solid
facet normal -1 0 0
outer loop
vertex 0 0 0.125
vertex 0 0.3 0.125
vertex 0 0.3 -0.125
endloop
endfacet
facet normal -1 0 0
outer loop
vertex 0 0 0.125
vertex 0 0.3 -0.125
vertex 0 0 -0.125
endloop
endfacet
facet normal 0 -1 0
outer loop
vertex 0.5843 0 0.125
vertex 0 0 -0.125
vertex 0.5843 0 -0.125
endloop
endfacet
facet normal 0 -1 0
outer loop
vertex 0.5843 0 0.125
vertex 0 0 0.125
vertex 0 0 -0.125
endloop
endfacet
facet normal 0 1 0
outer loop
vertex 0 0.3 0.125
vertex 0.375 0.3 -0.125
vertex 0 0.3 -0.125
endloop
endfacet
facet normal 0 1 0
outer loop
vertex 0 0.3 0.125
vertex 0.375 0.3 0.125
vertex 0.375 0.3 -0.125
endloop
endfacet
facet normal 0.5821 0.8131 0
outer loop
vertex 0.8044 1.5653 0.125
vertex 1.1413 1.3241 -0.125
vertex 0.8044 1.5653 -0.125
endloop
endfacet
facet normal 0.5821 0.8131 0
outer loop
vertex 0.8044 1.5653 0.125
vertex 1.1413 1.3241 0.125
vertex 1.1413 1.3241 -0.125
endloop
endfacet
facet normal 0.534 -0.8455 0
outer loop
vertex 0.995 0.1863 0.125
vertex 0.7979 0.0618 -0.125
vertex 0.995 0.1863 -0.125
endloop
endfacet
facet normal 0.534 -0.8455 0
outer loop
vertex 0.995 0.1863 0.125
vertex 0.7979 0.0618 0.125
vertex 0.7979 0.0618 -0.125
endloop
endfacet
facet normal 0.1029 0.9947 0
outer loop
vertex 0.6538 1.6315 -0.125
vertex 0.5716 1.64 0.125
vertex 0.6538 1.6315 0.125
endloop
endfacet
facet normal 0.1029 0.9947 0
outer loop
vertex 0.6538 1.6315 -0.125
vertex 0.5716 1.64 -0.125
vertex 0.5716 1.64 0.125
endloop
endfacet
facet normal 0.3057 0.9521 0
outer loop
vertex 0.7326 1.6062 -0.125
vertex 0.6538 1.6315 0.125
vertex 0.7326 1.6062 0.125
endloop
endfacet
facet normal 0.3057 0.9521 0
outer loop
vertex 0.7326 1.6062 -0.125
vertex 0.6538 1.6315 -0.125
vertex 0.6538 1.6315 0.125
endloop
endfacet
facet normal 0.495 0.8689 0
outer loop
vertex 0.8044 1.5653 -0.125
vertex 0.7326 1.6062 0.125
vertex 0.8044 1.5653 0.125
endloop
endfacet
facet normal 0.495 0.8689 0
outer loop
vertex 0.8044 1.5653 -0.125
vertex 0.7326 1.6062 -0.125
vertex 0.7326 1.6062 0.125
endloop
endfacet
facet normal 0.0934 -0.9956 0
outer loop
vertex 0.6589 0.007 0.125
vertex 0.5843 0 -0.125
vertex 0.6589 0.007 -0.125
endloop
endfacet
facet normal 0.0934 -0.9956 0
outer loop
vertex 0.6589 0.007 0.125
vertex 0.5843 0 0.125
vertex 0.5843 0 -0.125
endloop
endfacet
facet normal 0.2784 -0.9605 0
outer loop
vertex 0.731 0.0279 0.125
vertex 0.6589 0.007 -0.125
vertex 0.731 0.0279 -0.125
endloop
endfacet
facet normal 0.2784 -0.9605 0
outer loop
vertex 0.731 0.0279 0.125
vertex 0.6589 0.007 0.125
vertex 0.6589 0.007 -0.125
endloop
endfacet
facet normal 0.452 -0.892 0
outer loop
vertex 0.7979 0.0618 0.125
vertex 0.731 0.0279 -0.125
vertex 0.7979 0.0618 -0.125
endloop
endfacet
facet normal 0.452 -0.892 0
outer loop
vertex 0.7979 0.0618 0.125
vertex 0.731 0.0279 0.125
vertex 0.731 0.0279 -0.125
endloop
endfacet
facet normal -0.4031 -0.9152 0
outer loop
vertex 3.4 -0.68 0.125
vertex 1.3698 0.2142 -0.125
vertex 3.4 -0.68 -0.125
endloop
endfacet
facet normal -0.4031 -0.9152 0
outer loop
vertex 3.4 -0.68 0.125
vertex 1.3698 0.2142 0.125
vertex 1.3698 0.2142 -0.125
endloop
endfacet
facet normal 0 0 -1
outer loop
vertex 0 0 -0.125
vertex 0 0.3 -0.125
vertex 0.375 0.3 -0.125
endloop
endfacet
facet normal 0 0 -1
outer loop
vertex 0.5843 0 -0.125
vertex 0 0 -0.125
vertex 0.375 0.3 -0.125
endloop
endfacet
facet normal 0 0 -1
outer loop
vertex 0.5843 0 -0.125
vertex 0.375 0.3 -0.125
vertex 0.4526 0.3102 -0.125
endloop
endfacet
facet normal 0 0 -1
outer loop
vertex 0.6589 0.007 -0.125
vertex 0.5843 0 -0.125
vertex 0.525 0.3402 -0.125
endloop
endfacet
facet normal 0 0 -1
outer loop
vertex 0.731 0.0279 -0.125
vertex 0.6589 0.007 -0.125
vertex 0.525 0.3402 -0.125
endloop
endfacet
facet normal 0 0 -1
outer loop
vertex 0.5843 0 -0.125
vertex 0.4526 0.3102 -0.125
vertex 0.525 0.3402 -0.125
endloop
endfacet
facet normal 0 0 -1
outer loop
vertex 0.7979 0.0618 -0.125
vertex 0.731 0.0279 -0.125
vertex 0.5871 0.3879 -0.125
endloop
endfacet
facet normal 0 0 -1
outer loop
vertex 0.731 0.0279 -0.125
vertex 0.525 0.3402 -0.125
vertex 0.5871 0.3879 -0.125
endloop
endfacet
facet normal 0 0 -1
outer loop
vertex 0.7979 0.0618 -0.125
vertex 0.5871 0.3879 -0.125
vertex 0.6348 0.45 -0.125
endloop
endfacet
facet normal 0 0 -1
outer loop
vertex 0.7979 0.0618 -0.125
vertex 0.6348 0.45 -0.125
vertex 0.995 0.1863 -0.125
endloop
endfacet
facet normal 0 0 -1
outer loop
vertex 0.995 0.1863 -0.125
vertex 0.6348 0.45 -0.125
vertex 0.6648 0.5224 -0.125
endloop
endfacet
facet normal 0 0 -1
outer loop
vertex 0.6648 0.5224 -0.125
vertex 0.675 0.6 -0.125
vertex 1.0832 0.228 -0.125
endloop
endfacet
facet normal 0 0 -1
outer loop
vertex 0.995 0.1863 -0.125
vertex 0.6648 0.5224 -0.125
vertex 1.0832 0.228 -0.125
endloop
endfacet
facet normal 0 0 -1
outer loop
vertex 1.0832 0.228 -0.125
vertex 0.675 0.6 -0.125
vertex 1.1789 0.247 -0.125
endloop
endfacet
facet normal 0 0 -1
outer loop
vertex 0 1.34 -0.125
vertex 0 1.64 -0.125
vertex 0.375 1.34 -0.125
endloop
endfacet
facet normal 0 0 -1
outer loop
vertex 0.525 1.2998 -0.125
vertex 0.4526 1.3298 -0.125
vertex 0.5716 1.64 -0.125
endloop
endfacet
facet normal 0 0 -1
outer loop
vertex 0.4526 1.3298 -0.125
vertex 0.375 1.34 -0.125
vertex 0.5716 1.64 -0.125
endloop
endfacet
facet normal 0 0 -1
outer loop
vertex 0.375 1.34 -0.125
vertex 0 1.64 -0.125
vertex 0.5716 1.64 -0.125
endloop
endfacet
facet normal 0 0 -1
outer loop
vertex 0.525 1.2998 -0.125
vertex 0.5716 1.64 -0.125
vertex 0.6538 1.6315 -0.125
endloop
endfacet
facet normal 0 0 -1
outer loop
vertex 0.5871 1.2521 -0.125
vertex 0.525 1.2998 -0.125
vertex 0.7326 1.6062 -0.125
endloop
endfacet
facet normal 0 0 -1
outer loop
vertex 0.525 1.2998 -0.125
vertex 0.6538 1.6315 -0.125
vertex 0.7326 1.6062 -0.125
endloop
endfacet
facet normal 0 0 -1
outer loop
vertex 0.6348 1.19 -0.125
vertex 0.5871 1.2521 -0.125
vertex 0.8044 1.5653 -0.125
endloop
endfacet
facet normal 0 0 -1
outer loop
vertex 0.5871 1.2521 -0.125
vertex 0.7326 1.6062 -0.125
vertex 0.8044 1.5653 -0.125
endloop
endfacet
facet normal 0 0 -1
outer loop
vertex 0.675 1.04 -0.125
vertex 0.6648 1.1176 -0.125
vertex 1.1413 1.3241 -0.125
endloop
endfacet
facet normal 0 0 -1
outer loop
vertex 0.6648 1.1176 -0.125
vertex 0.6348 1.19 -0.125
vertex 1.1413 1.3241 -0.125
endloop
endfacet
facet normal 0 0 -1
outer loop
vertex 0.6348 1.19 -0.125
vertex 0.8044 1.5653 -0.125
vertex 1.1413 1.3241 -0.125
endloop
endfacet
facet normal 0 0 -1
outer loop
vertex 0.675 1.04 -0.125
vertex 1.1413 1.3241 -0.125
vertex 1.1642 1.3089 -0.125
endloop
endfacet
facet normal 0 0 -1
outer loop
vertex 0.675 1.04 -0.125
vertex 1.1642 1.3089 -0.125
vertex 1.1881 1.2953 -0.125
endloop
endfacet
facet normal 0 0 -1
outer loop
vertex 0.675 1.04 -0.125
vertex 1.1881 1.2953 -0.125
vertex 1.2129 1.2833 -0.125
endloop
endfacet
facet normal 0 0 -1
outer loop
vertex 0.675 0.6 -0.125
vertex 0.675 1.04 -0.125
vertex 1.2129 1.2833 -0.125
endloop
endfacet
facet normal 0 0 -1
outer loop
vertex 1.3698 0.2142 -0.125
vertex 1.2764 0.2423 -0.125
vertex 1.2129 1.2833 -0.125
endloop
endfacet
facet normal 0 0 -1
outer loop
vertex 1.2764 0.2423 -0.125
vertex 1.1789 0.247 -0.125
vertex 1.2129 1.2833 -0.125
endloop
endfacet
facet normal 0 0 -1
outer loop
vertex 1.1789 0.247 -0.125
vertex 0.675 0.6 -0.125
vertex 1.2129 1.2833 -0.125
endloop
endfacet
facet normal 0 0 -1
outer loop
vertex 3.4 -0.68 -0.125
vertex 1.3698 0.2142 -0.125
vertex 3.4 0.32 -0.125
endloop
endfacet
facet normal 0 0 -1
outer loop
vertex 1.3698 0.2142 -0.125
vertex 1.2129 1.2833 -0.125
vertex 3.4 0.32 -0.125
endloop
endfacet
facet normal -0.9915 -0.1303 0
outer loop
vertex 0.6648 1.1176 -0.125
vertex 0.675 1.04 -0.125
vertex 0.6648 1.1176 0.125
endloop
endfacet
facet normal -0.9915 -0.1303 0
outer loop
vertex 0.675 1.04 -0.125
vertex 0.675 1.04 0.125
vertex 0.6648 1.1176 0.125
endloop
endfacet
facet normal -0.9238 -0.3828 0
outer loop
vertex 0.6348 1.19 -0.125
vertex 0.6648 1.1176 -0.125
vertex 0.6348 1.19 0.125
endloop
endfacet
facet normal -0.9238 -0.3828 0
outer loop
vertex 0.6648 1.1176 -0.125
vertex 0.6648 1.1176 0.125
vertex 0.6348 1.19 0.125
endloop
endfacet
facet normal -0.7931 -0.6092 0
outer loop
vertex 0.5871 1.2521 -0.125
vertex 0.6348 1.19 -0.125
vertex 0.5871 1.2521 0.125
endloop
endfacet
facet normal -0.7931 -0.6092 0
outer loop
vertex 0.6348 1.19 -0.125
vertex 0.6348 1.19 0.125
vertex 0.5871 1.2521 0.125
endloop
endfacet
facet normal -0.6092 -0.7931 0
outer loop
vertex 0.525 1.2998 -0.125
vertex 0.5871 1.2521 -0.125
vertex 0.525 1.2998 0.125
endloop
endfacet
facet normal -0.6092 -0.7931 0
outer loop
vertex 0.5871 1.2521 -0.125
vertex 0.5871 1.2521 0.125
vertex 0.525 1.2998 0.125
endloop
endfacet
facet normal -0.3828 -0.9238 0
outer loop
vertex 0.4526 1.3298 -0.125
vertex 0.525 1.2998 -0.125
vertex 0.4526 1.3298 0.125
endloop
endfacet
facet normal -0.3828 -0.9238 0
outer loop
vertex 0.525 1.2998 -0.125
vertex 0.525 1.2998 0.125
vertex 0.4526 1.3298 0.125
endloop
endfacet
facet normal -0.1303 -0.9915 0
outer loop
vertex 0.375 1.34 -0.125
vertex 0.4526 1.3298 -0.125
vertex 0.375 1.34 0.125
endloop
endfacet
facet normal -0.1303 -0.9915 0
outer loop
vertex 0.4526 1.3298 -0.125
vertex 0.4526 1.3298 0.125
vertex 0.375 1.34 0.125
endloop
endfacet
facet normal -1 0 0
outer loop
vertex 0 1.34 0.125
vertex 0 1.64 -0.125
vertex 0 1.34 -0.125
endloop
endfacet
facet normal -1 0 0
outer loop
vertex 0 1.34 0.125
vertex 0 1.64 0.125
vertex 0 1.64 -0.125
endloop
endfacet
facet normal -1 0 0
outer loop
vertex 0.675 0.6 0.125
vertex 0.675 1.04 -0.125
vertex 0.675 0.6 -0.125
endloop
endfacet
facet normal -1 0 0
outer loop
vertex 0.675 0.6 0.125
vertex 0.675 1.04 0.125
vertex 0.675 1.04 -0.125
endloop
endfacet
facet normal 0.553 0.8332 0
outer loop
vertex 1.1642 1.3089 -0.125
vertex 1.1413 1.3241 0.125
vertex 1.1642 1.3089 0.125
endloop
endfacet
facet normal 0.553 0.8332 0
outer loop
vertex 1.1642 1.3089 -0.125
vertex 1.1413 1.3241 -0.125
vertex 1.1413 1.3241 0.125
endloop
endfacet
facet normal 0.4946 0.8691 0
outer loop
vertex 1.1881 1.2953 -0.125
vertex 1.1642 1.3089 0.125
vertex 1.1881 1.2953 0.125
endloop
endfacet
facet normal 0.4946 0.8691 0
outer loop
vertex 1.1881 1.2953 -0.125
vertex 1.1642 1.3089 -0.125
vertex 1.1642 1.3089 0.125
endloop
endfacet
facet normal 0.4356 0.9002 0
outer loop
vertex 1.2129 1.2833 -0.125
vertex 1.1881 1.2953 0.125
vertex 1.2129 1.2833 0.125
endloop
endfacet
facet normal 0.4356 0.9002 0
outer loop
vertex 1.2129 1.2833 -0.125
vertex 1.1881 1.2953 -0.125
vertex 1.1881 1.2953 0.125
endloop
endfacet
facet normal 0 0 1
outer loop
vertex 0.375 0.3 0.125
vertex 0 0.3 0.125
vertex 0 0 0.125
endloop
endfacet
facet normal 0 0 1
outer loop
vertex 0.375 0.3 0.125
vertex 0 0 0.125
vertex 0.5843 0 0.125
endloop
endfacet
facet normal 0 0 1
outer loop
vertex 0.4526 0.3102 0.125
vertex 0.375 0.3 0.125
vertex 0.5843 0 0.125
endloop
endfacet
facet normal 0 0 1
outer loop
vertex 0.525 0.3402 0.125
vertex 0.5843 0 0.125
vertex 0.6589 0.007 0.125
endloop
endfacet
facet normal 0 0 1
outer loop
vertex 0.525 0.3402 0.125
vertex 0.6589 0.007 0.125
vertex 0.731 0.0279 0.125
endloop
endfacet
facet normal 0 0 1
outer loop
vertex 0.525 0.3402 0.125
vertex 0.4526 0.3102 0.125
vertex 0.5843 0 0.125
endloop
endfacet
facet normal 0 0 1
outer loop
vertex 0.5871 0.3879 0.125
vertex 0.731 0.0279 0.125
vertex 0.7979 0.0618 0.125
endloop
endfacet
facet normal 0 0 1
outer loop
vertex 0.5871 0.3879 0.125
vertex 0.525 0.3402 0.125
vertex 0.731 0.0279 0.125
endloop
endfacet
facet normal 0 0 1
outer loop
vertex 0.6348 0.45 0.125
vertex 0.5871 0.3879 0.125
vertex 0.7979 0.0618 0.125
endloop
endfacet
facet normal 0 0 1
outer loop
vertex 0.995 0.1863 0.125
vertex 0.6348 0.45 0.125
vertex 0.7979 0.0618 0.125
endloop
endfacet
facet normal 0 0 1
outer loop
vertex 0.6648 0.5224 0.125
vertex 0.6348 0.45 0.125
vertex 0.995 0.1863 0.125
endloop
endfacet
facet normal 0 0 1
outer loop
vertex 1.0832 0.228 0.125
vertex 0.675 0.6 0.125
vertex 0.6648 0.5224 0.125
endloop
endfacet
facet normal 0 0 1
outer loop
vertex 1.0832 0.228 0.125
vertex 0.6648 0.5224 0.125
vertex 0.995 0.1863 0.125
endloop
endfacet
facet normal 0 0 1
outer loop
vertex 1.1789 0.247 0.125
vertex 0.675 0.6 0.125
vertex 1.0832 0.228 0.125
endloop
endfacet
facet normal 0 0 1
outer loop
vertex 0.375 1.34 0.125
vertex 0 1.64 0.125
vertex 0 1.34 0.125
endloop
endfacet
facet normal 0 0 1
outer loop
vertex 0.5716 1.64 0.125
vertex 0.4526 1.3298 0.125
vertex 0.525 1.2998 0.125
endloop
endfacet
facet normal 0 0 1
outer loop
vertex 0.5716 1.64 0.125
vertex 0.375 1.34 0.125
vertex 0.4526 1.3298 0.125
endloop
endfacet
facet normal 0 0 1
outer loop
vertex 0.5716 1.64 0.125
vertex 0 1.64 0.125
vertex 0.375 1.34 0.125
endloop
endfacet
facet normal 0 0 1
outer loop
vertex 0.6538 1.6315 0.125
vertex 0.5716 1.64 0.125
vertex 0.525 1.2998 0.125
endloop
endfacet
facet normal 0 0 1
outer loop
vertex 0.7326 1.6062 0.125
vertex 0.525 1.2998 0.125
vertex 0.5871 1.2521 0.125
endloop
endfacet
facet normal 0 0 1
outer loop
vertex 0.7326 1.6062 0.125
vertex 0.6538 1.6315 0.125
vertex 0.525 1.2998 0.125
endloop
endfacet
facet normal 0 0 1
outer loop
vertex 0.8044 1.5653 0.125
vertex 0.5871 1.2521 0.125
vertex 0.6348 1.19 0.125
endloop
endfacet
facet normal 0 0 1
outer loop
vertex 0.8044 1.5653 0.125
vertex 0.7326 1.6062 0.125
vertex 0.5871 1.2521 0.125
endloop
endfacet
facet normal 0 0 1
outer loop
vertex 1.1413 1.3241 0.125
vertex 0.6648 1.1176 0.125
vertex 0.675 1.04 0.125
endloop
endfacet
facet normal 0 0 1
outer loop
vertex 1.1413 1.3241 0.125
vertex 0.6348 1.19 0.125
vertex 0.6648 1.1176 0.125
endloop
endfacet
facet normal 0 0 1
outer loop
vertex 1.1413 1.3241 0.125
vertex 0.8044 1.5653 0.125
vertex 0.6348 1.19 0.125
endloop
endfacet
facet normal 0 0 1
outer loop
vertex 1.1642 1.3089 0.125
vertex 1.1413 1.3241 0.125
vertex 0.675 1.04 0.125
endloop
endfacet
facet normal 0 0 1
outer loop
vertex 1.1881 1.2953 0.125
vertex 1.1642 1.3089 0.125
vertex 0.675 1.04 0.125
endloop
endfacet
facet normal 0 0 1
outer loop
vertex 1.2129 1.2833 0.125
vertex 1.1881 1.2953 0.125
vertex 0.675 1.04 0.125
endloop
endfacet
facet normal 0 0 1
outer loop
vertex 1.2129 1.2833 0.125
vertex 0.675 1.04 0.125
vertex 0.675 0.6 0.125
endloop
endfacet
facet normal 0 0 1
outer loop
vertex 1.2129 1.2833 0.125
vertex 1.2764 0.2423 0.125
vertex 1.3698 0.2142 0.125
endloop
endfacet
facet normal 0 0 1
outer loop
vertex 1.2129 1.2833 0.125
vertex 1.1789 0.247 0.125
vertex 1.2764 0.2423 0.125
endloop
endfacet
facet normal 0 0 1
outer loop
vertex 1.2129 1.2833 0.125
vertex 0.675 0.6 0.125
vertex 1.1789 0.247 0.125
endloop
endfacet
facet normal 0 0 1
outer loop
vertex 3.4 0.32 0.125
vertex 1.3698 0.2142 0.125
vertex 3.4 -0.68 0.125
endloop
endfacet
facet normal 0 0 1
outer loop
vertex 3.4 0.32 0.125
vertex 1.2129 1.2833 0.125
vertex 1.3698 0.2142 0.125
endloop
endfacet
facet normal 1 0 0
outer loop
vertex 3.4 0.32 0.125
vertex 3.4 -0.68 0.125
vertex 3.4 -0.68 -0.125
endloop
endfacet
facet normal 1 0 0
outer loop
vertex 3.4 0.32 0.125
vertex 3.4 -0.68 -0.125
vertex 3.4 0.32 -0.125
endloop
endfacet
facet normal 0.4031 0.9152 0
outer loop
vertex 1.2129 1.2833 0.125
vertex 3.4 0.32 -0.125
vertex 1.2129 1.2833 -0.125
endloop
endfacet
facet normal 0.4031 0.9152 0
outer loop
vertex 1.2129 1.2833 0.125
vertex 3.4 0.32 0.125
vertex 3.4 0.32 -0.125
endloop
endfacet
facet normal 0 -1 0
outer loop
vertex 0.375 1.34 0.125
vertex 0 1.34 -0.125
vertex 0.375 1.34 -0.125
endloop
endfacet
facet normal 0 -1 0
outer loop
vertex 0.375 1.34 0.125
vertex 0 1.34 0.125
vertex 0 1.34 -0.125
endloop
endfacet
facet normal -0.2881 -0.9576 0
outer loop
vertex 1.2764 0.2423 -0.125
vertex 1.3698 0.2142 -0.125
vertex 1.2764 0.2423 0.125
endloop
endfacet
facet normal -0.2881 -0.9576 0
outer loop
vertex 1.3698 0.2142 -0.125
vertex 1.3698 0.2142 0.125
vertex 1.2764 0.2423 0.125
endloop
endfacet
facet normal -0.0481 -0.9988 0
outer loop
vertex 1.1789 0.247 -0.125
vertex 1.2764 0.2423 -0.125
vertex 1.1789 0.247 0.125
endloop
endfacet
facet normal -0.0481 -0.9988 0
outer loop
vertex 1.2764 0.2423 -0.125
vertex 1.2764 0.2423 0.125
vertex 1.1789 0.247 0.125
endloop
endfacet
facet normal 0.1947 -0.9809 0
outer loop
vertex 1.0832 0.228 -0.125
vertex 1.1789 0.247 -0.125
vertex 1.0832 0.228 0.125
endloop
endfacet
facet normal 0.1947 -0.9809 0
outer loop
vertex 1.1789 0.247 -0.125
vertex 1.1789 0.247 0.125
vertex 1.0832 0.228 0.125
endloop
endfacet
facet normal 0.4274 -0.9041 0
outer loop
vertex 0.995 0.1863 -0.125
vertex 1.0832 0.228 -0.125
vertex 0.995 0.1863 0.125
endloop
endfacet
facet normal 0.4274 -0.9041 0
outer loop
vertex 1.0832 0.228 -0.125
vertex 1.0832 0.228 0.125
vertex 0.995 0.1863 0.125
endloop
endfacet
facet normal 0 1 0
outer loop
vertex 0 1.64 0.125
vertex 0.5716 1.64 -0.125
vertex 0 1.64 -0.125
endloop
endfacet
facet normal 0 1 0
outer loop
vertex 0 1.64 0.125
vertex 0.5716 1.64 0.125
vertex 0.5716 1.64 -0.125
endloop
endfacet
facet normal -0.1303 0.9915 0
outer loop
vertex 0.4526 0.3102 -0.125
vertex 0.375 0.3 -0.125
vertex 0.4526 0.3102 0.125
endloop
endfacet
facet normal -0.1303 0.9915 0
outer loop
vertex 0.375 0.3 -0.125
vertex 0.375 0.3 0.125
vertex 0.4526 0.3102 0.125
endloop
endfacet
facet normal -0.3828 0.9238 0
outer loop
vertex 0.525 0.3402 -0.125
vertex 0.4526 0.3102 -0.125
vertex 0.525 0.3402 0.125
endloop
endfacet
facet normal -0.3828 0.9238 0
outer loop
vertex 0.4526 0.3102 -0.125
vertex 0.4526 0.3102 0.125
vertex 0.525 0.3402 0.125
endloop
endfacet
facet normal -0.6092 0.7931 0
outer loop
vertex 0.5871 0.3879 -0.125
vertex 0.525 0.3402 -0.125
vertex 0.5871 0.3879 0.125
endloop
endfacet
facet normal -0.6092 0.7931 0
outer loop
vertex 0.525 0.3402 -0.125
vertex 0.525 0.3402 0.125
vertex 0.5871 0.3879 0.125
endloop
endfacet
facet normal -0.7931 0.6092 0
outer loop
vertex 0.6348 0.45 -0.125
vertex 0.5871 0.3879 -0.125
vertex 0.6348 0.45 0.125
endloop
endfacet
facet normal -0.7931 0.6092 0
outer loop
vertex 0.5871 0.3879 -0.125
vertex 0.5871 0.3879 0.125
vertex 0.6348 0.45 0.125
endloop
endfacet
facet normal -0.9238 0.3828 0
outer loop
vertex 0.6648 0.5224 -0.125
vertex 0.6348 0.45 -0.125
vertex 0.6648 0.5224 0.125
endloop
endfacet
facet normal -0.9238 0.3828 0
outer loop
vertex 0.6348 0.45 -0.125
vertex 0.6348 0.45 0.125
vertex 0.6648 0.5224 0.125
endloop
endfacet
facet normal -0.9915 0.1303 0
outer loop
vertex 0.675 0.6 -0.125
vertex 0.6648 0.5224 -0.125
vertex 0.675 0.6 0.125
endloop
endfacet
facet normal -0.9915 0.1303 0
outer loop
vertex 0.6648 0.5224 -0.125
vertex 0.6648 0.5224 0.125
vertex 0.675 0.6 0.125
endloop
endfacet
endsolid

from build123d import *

# Parameters (mm, degrees)
BOSS_EXTRUDE1_DEPTH = 0.125
FILLET1_R           = 0.3
FILLET2_R           = 0.4


with BuildPart() as part:
    # frame_outline → Boss-Extrude1 (new, symmetric)
    with BuildSketch(Plane.XY):
        Polygon((0, 1.64), (0, 1.34), (0.675, 1.34), (0.675, 0.3), (0, 0.3), (0, 0), (0.7, 0), (1.175, 0.3), (3.4, -0.68), (3.4, 0.32), (1.175, 1.3), (0.7, 1.64), align=None)
    extrude(amount=BOSS_EXTRUDE1_DEPTH, both=True)

    # Fillet1
    fillet1_edges = [part.edges().sort_by_distance(p)[0] for p in [
        (0.675, 0.3, 0),
        (0.675, 1.34, 0),
    ]]
    fillet(fillet1_edges, radius=FILLET1_R)

    # Fillet2
    fillet2_edges = [part.edges().sort_by_distance(p)[0] for p in [
        (0.7, 1.64, 0),
        (1.175, 1.3, 0),
        (1.175, 0.3, 0),
        (0.7, 0, 0),
    ]]
    fillet(fillet2_edges, radius=FILLET2_R)


solid = part.part
